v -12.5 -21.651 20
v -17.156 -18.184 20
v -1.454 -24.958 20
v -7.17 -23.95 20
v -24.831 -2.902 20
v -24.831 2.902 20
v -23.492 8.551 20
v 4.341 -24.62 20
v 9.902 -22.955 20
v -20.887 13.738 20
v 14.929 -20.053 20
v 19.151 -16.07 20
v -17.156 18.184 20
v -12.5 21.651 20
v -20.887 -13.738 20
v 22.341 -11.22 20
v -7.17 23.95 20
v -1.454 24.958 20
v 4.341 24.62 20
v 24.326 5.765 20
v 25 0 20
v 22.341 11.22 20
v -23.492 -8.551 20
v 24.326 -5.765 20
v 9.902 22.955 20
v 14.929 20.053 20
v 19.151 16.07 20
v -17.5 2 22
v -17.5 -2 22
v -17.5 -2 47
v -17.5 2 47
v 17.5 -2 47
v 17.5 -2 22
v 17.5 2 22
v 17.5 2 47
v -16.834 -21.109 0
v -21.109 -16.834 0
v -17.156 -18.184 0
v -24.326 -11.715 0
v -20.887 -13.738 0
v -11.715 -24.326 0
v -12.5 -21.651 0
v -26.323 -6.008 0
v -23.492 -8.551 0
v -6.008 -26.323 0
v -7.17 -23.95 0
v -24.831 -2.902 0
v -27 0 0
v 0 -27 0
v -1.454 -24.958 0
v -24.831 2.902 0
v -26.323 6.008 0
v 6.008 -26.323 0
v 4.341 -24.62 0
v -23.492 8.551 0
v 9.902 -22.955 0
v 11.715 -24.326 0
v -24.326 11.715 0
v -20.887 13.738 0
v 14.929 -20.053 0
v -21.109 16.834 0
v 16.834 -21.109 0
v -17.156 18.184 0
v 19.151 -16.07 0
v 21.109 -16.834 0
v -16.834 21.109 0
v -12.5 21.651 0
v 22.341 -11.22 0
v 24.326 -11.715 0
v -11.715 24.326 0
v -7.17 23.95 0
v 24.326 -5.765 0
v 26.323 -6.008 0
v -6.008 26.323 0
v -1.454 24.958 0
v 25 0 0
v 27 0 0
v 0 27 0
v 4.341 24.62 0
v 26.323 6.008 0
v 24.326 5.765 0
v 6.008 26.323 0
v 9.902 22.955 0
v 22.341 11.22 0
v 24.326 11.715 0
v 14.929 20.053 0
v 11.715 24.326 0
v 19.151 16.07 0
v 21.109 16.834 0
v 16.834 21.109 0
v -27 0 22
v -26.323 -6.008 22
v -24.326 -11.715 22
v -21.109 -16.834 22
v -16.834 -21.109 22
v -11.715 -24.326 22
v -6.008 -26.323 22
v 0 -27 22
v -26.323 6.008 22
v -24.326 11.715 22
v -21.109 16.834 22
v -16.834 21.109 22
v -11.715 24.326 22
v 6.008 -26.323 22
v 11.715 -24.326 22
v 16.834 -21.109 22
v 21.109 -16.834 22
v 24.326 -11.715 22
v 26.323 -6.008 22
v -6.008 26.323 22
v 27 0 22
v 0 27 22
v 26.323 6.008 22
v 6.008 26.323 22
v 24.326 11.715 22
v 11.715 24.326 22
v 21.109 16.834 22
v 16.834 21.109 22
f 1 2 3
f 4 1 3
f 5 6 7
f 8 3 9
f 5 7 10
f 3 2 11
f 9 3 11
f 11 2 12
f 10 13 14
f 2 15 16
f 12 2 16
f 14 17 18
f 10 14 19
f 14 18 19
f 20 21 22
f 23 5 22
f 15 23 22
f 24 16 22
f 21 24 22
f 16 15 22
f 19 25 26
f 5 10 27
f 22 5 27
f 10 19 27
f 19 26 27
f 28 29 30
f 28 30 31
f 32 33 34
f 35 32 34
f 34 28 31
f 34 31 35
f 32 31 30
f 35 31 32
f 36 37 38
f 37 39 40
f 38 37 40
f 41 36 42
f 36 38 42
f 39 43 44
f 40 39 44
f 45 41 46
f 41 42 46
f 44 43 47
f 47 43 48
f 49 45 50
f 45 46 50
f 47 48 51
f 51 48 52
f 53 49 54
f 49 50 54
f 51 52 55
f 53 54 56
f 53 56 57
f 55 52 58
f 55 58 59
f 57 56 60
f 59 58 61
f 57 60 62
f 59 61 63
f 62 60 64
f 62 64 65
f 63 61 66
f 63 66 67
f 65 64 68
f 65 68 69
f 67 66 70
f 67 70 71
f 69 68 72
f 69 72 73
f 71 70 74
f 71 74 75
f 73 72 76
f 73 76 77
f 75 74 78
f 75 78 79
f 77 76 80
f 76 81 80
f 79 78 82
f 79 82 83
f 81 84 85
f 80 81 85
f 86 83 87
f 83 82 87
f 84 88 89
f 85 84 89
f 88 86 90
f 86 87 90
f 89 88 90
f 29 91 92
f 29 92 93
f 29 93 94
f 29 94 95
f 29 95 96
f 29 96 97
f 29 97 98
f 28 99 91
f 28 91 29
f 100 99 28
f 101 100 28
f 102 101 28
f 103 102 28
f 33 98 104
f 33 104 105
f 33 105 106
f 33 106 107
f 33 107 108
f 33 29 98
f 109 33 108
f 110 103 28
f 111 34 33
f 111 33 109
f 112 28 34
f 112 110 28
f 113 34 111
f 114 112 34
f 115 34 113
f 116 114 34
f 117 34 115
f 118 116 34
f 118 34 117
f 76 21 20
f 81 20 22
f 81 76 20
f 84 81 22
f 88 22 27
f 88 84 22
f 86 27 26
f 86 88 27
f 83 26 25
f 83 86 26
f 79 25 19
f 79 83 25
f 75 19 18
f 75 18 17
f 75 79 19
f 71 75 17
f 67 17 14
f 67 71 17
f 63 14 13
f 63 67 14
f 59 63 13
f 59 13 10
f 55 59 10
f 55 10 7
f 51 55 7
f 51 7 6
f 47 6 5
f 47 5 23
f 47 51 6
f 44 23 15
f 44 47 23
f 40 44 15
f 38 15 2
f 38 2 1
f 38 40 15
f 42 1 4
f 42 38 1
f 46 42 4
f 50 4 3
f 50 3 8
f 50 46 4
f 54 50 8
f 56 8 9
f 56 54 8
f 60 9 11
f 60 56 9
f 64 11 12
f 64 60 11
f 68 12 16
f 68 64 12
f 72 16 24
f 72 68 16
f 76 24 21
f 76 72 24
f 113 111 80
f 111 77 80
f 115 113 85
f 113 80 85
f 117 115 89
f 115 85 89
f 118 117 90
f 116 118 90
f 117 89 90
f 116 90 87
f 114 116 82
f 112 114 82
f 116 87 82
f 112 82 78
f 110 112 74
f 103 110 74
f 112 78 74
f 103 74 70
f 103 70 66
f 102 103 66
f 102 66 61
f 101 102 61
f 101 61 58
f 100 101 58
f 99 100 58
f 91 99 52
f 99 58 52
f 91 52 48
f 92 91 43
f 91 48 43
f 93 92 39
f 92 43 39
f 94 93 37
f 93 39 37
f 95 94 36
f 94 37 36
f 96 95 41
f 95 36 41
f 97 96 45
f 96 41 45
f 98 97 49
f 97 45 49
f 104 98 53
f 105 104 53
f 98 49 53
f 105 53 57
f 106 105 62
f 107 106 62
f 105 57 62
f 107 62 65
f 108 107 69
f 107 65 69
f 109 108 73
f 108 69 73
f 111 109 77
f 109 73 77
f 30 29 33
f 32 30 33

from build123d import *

# Parameters (mm, degrees)
F0_R     = 27
F0_R_2   = 25
F1_DEPTH = 20
F2_R     = 27
F3_DEPTH = 2
F4_W     = 35
F4_H     = 4
F5_DEPTH = 25


with BuildPart() as f1:
    # F0 (on Top) → F1 (new body)
    with BuildSketch(Plane.XY):
        Circle(F0_R)
        Circle(F0_R_2, mode=Mode.SUBTRACT)
    extrude(amount=F1_DEPTH)

    # F2 (on face) → F3 (join)
    with BuildSketch(Plane.XY.offset(20)):
        Circle(F2_R)
    extrude(amount=F3_DEPTH)

    # F4 (on face) → F5 (join)
    with BuildSketch(Plane.XY.offset(22)):
        Rectangle(F4_W, F4_H)
    extrude(amount=F5_DEPTH)


solid = f1.part
